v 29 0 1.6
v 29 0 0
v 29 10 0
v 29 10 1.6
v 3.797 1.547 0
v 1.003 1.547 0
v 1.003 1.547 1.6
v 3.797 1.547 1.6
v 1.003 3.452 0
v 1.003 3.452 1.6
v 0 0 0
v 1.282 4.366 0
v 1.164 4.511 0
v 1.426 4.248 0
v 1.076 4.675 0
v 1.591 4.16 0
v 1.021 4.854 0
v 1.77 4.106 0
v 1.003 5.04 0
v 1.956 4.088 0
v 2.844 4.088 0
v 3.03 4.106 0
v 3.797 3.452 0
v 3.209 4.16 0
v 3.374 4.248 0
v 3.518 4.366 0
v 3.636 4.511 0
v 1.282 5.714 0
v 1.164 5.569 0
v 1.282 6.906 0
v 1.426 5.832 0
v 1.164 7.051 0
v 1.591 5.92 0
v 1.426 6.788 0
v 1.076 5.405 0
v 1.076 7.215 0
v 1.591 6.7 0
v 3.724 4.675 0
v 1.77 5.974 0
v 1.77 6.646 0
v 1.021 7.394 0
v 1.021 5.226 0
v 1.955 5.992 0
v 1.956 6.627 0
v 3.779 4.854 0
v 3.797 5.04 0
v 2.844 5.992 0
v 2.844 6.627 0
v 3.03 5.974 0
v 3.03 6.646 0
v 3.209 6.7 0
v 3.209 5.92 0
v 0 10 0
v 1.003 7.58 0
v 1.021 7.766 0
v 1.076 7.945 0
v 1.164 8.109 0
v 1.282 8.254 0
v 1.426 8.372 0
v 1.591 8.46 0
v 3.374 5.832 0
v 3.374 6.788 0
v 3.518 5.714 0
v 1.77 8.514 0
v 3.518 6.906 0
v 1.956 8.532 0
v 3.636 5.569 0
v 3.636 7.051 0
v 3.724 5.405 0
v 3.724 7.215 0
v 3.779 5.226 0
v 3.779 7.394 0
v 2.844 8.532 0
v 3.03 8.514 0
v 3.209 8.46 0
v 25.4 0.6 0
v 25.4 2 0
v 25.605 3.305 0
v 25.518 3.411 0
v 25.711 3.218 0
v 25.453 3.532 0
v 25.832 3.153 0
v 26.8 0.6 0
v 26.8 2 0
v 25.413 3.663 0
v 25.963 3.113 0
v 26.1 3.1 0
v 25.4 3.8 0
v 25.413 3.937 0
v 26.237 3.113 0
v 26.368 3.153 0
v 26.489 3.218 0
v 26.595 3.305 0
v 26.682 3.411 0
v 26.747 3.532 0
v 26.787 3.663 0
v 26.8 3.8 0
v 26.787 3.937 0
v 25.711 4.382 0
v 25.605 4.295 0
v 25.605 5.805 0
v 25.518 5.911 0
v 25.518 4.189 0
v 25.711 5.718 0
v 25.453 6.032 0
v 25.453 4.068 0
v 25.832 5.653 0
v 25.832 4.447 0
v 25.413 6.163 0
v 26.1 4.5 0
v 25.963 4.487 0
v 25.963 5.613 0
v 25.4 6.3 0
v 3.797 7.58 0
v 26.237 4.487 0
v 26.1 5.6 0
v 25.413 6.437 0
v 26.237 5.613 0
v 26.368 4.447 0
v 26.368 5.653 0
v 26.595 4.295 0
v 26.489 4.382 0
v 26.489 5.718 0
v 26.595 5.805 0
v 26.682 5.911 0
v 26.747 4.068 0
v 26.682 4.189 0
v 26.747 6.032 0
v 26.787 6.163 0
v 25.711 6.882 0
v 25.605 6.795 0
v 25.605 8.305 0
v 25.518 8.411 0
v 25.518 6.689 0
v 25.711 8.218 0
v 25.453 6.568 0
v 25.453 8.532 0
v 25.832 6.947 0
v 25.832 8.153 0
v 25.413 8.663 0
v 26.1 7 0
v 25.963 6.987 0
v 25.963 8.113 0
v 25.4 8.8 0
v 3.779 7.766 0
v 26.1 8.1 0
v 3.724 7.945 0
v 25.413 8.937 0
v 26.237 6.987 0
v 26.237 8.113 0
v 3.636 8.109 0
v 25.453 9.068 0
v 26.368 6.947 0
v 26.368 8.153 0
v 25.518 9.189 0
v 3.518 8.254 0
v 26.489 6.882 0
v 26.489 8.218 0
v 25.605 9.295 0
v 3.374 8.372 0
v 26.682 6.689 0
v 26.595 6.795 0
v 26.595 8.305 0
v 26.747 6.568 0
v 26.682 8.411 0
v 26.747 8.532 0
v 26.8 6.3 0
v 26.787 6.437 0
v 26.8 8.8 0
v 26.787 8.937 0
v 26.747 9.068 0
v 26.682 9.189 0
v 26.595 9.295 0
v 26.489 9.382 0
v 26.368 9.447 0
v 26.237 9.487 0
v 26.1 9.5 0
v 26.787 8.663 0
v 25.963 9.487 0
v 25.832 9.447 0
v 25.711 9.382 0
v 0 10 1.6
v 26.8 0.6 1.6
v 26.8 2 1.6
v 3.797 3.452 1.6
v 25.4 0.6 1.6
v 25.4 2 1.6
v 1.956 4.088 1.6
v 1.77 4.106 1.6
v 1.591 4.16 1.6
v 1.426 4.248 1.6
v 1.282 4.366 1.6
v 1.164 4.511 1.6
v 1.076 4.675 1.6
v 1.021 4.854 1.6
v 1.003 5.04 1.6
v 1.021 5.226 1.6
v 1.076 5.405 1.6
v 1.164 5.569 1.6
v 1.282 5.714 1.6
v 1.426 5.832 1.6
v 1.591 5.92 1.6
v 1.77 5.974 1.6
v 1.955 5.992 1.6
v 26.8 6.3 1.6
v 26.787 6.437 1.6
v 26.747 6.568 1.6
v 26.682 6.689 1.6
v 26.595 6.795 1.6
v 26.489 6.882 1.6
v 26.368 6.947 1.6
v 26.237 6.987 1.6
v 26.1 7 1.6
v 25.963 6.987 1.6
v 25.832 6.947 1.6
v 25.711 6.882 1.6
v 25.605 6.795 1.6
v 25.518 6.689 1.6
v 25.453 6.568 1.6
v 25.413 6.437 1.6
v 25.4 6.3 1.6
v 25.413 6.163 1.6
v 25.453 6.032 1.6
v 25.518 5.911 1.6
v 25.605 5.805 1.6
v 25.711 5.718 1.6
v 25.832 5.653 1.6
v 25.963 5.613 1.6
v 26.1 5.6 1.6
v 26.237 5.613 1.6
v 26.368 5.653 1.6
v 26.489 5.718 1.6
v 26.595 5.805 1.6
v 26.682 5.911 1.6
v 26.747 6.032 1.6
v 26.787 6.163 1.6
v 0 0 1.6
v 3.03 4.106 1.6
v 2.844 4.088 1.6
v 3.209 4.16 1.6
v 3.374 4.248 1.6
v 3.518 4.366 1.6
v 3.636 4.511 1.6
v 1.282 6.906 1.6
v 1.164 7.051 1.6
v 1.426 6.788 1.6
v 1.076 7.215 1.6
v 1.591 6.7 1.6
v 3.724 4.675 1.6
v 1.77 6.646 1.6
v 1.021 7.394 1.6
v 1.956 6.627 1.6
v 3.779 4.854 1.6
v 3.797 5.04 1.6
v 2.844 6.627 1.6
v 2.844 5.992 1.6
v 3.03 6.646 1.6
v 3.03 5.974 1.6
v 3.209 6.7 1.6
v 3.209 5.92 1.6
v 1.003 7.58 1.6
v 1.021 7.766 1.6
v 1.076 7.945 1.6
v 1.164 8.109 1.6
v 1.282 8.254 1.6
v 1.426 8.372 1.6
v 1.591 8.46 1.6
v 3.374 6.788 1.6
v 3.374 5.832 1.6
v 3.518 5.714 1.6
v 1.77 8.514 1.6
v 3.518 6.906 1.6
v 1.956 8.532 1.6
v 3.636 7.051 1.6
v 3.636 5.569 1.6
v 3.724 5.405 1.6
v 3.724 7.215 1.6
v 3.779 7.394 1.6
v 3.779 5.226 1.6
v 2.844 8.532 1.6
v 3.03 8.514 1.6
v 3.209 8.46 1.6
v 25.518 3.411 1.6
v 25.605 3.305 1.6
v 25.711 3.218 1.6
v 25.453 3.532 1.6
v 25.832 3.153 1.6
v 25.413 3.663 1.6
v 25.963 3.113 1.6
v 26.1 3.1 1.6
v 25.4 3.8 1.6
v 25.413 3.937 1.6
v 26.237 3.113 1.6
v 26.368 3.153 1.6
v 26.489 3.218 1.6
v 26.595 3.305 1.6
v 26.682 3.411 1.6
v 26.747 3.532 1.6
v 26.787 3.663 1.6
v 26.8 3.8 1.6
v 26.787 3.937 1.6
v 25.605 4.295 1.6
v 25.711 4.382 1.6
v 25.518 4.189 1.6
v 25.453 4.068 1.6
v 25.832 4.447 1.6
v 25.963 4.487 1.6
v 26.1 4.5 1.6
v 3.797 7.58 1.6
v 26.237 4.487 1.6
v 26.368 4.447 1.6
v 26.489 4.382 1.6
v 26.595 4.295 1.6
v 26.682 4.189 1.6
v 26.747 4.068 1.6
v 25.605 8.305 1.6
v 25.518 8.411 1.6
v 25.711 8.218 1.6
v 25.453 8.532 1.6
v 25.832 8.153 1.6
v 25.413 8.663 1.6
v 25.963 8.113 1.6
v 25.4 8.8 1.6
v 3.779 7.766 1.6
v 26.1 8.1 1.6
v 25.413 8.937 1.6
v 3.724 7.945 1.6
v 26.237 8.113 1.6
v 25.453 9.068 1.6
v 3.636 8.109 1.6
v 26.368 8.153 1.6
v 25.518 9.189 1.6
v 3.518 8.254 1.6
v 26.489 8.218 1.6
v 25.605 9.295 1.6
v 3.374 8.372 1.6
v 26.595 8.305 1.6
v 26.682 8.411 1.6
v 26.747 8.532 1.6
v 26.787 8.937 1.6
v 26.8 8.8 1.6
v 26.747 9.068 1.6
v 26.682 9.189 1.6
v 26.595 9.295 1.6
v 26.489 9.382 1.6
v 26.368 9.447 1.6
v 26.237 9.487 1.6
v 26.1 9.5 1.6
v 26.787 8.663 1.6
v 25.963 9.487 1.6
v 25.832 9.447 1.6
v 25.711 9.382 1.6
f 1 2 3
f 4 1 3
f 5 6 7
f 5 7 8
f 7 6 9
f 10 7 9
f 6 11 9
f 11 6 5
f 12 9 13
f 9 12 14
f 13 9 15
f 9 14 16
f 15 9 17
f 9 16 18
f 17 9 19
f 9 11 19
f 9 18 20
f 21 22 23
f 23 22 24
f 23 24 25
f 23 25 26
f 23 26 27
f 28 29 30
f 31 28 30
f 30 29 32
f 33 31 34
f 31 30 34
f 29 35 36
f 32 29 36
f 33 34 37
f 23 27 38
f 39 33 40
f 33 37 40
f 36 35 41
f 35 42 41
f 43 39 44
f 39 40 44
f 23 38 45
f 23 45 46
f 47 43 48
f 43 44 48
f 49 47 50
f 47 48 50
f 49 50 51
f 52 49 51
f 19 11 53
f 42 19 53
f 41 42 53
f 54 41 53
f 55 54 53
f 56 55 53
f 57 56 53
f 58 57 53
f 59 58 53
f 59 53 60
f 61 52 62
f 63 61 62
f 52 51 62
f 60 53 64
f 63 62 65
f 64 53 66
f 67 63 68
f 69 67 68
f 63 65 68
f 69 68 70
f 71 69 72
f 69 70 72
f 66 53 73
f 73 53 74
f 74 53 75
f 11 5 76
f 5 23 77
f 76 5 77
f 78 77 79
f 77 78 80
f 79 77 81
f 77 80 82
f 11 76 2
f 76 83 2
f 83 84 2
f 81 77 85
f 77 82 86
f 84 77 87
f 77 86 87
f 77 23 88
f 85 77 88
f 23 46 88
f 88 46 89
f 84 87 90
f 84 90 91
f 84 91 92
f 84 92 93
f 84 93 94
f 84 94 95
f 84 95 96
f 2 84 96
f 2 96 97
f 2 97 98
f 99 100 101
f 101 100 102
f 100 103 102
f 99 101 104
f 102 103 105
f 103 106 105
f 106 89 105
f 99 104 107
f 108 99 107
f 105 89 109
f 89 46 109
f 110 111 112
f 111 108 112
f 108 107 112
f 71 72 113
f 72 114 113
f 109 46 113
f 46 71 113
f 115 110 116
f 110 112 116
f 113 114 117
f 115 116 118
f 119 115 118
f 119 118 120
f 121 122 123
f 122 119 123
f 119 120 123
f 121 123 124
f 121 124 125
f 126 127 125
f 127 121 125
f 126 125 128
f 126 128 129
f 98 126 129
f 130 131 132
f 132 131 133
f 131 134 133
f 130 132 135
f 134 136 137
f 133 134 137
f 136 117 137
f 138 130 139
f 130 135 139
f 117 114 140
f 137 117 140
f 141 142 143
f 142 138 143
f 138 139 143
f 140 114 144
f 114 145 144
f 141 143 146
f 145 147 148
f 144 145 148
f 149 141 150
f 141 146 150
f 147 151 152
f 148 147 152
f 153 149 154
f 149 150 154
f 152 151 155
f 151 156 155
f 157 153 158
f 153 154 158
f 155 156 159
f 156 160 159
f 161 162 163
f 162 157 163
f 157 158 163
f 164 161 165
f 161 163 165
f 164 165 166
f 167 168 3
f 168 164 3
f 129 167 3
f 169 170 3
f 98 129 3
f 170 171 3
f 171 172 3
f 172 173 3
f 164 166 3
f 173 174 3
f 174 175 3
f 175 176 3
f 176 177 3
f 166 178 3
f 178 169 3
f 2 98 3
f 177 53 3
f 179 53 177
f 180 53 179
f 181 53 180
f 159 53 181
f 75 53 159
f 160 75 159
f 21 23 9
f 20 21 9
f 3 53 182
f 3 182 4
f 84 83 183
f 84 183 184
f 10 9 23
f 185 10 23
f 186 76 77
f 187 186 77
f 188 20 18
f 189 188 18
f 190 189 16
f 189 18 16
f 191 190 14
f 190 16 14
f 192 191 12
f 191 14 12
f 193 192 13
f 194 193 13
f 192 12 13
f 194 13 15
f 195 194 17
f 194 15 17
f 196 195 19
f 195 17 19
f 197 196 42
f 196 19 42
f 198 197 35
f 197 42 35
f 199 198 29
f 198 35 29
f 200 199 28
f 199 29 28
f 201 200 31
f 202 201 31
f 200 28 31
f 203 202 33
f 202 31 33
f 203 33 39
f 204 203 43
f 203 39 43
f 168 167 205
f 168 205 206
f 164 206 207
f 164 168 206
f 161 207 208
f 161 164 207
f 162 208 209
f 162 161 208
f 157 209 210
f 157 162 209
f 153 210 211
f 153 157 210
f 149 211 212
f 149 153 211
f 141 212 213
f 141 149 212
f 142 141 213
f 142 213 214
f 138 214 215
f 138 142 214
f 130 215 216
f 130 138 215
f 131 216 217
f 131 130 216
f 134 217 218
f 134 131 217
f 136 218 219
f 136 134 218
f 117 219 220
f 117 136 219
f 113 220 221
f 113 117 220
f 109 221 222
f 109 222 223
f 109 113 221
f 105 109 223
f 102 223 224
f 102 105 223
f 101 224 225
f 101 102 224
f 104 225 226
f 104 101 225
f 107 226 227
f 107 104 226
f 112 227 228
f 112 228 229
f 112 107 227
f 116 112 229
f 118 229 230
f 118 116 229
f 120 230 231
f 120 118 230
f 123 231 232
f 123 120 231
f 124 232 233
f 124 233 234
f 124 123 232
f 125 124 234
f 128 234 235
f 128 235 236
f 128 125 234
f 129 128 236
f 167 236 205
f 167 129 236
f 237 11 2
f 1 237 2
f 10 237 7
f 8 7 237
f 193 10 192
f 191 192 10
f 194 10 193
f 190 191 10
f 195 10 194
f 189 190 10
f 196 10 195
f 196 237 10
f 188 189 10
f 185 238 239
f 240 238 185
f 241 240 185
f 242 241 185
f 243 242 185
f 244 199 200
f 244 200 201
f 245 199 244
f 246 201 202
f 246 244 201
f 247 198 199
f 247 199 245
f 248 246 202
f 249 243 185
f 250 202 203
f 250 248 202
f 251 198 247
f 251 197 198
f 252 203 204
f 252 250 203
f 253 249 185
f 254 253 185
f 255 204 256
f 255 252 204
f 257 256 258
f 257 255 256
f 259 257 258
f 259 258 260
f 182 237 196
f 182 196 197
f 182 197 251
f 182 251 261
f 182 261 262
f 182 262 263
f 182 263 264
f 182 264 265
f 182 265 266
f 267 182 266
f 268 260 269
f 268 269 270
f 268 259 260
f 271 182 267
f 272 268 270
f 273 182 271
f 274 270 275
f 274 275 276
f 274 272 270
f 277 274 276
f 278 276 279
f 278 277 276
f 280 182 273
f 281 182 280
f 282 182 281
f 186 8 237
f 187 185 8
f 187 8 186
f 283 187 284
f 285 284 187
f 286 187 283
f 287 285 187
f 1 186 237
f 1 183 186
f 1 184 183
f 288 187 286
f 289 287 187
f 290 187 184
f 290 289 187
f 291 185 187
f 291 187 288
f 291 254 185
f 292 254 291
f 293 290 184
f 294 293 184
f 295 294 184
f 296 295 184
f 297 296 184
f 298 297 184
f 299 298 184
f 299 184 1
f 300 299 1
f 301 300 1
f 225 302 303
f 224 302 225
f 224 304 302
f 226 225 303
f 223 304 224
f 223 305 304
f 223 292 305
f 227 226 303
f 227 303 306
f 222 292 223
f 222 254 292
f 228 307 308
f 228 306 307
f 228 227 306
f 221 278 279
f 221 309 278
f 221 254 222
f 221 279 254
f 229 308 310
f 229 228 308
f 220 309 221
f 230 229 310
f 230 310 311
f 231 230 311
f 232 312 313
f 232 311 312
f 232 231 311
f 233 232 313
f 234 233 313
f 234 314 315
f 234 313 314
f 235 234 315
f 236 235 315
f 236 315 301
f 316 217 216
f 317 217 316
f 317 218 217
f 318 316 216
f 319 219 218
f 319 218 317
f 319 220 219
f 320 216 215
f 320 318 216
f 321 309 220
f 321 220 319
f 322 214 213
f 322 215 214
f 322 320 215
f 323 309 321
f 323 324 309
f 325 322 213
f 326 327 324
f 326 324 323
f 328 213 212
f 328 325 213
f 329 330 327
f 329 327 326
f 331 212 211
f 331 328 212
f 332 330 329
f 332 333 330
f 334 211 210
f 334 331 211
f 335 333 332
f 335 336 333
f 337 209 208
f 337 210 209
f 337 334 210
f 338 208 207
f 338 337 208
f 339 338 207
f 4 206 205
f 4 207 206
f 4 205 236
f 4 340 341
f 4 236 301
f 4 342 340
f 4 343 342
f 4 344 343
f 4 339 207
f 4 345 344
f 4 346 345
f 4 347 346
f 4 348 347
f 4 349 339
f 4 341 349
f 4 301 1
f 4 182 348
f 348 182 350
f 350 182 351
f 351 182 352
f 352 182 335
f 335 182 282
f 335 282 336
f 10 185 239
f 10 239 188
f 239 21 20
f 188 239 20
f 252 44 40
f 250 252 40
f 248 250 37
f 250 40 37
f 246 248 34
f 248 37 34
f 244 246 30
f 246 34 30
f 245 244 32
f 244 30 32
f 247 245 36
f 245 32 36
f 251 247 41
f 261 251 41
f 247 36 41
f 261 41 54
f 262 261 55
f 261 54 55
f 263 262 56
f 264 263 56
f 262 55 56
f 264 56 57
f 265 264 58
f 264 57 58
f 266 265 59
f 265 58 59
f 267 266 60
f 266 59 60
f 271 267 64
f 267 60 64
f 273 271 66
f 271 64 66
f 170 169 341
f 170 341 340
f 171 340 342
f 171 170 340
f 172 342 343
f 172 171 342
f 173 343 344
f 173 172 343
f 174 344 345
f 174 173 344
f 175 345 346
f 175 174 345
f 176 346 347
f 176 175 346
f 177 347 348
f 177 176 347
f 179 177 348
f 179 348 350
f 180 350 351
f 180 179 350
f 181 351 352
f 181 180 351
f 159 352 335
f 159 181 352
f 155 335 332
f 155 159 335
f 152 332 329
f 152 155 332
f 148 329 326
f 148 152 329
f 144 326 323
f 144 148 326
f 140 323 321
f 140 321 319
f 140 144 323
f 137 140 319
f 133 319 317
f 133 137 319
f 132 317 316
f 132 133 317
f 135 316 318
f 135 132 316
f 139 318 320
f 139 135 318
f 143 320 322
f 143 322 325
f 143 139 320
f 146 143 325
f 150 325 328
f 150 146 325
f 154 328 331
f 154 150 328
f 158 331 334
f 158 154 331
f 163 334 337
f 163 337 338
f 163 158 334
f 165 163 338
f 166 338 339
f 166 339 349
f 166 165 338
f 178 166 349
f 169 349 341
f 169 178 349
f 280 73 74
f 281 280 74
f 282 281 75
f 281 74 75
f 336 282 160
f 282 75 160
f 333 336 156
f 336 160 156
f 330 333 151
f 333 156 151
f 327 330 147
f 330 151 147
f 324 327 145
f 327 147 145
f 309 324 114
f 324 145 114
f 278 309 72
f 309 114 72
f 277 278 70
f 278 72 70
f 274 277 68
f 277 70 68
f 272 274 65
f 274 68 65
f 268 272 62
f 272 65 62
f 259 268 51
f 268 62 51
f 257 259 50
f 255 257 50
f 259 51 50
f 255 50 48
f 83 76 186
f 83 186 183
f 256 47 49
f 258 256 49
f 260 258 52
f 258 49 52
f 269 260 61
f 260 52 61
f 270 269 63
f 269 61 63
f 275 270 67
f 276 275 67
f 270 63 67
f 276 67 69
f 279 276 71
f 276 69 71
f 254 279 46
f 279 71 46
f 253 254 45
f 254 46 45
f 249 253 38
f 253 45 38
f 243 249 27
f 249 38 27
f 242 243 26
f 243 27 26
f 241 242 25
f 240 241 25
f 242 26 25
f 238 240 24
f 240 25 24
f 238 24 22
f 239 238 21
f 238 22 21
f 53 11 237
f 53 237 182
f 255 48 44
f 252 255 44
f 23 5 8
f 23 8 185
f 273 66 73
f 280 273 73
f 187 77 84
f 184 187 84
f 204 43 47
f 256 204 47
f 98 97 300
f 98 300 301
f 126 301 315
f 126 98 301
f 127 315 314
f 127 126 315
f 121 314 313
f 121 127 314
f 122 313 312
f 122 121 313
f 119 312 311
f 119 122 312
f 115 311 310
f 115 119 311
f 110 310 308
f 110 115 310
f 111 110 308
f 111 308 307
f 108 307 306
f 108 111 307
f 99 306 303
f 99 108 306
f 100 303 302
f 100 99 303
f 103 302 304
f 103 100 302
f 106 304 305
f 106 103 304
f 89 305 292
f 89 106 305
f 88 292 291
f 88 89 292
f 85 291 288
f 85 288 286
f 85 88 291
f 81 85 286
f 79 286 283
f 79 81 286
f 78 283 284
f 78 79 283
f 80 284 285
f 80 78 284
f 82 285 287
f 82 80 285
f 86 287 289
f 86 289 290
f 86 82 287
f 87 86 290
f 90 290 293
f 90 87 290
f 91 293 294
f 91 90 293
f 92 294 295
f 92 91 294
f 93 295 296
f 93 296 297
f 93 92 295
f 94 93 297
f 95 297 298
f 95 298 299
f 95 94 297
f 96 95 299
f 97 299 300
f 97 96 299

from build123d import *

# Parameters (mm, degrees)
MODEL_W            = 29
MODEL_H            = 10
MODEL_R            = 0.7
MODEL_W_2          = 2.794
MODEL_H_2          = 1.905
MODEL_W_3          = 1.4
MODEL_H_3          = 1.4
BOSS_EXTRU_1_DEPTH = 1.6


with BuildPart() as part:
    # Model → Boss.-Extru.1 (new body)
    with BuildSketch(Plane.XY):
        with Locations((14.5, 5)):
            Rectangle(MODEL_W, MODEL_H)
        with Locations((26.1, 3.8)):
            Circle(MODEL_R, mode=Mode.SUBTRACT)
        with Locations((26.1, 6.3)):
            Circle(MODEL_R, mode=Mode.SUBTRACT)
        with Locations((26.1, 8.8)):
            Circle(MODEL_R, mode=Mode.SUBTRACT)
        with Locations((2.4, 2.5)):
            Rectangle(MODEL_W_2, MODEL_H_2, mode=Mode.SUBTRACT)
        with BuildLine():
            Line((1.9555, 5.9925), (2.8445, 5.9925))
            ThreePointArc((2.8445, 5.9925), (3.797, 5.04), (2.8445, 4.0875))
            Line((2.8445, 4.0875), (1.9555, 4.0875))
            ThreePointArc((1.9555, 4.0875), (1.003, 5.04), (1.9555, 5.9925))
        make_face(mode=Mode.SUBTRACT)
        with BuildLine():
            Line((1.9555, 8.5325), (2.8445, 8.5325))
            ThreePointArc((2.8445, 8.5325), (3.797, 7.58), (2.8445, 6.6275))
            Line((2.8445, 6.6275), (1.9555, 6.6275))
            ThreePointArc((1.9555, 6.6275), (1.003, 7.58), (1.9555, 8.5325))
        make_face(mode=Mode.SUBTRACT)
        with Locations((26.1, 1.3)):
            Rectangle(MODEL_W_3, MODEL_H_3, mode=Mode.SUBTRACT)
    extrude(amount=BOSS_EXTRU_1_DEPTH)


solid = part.part
